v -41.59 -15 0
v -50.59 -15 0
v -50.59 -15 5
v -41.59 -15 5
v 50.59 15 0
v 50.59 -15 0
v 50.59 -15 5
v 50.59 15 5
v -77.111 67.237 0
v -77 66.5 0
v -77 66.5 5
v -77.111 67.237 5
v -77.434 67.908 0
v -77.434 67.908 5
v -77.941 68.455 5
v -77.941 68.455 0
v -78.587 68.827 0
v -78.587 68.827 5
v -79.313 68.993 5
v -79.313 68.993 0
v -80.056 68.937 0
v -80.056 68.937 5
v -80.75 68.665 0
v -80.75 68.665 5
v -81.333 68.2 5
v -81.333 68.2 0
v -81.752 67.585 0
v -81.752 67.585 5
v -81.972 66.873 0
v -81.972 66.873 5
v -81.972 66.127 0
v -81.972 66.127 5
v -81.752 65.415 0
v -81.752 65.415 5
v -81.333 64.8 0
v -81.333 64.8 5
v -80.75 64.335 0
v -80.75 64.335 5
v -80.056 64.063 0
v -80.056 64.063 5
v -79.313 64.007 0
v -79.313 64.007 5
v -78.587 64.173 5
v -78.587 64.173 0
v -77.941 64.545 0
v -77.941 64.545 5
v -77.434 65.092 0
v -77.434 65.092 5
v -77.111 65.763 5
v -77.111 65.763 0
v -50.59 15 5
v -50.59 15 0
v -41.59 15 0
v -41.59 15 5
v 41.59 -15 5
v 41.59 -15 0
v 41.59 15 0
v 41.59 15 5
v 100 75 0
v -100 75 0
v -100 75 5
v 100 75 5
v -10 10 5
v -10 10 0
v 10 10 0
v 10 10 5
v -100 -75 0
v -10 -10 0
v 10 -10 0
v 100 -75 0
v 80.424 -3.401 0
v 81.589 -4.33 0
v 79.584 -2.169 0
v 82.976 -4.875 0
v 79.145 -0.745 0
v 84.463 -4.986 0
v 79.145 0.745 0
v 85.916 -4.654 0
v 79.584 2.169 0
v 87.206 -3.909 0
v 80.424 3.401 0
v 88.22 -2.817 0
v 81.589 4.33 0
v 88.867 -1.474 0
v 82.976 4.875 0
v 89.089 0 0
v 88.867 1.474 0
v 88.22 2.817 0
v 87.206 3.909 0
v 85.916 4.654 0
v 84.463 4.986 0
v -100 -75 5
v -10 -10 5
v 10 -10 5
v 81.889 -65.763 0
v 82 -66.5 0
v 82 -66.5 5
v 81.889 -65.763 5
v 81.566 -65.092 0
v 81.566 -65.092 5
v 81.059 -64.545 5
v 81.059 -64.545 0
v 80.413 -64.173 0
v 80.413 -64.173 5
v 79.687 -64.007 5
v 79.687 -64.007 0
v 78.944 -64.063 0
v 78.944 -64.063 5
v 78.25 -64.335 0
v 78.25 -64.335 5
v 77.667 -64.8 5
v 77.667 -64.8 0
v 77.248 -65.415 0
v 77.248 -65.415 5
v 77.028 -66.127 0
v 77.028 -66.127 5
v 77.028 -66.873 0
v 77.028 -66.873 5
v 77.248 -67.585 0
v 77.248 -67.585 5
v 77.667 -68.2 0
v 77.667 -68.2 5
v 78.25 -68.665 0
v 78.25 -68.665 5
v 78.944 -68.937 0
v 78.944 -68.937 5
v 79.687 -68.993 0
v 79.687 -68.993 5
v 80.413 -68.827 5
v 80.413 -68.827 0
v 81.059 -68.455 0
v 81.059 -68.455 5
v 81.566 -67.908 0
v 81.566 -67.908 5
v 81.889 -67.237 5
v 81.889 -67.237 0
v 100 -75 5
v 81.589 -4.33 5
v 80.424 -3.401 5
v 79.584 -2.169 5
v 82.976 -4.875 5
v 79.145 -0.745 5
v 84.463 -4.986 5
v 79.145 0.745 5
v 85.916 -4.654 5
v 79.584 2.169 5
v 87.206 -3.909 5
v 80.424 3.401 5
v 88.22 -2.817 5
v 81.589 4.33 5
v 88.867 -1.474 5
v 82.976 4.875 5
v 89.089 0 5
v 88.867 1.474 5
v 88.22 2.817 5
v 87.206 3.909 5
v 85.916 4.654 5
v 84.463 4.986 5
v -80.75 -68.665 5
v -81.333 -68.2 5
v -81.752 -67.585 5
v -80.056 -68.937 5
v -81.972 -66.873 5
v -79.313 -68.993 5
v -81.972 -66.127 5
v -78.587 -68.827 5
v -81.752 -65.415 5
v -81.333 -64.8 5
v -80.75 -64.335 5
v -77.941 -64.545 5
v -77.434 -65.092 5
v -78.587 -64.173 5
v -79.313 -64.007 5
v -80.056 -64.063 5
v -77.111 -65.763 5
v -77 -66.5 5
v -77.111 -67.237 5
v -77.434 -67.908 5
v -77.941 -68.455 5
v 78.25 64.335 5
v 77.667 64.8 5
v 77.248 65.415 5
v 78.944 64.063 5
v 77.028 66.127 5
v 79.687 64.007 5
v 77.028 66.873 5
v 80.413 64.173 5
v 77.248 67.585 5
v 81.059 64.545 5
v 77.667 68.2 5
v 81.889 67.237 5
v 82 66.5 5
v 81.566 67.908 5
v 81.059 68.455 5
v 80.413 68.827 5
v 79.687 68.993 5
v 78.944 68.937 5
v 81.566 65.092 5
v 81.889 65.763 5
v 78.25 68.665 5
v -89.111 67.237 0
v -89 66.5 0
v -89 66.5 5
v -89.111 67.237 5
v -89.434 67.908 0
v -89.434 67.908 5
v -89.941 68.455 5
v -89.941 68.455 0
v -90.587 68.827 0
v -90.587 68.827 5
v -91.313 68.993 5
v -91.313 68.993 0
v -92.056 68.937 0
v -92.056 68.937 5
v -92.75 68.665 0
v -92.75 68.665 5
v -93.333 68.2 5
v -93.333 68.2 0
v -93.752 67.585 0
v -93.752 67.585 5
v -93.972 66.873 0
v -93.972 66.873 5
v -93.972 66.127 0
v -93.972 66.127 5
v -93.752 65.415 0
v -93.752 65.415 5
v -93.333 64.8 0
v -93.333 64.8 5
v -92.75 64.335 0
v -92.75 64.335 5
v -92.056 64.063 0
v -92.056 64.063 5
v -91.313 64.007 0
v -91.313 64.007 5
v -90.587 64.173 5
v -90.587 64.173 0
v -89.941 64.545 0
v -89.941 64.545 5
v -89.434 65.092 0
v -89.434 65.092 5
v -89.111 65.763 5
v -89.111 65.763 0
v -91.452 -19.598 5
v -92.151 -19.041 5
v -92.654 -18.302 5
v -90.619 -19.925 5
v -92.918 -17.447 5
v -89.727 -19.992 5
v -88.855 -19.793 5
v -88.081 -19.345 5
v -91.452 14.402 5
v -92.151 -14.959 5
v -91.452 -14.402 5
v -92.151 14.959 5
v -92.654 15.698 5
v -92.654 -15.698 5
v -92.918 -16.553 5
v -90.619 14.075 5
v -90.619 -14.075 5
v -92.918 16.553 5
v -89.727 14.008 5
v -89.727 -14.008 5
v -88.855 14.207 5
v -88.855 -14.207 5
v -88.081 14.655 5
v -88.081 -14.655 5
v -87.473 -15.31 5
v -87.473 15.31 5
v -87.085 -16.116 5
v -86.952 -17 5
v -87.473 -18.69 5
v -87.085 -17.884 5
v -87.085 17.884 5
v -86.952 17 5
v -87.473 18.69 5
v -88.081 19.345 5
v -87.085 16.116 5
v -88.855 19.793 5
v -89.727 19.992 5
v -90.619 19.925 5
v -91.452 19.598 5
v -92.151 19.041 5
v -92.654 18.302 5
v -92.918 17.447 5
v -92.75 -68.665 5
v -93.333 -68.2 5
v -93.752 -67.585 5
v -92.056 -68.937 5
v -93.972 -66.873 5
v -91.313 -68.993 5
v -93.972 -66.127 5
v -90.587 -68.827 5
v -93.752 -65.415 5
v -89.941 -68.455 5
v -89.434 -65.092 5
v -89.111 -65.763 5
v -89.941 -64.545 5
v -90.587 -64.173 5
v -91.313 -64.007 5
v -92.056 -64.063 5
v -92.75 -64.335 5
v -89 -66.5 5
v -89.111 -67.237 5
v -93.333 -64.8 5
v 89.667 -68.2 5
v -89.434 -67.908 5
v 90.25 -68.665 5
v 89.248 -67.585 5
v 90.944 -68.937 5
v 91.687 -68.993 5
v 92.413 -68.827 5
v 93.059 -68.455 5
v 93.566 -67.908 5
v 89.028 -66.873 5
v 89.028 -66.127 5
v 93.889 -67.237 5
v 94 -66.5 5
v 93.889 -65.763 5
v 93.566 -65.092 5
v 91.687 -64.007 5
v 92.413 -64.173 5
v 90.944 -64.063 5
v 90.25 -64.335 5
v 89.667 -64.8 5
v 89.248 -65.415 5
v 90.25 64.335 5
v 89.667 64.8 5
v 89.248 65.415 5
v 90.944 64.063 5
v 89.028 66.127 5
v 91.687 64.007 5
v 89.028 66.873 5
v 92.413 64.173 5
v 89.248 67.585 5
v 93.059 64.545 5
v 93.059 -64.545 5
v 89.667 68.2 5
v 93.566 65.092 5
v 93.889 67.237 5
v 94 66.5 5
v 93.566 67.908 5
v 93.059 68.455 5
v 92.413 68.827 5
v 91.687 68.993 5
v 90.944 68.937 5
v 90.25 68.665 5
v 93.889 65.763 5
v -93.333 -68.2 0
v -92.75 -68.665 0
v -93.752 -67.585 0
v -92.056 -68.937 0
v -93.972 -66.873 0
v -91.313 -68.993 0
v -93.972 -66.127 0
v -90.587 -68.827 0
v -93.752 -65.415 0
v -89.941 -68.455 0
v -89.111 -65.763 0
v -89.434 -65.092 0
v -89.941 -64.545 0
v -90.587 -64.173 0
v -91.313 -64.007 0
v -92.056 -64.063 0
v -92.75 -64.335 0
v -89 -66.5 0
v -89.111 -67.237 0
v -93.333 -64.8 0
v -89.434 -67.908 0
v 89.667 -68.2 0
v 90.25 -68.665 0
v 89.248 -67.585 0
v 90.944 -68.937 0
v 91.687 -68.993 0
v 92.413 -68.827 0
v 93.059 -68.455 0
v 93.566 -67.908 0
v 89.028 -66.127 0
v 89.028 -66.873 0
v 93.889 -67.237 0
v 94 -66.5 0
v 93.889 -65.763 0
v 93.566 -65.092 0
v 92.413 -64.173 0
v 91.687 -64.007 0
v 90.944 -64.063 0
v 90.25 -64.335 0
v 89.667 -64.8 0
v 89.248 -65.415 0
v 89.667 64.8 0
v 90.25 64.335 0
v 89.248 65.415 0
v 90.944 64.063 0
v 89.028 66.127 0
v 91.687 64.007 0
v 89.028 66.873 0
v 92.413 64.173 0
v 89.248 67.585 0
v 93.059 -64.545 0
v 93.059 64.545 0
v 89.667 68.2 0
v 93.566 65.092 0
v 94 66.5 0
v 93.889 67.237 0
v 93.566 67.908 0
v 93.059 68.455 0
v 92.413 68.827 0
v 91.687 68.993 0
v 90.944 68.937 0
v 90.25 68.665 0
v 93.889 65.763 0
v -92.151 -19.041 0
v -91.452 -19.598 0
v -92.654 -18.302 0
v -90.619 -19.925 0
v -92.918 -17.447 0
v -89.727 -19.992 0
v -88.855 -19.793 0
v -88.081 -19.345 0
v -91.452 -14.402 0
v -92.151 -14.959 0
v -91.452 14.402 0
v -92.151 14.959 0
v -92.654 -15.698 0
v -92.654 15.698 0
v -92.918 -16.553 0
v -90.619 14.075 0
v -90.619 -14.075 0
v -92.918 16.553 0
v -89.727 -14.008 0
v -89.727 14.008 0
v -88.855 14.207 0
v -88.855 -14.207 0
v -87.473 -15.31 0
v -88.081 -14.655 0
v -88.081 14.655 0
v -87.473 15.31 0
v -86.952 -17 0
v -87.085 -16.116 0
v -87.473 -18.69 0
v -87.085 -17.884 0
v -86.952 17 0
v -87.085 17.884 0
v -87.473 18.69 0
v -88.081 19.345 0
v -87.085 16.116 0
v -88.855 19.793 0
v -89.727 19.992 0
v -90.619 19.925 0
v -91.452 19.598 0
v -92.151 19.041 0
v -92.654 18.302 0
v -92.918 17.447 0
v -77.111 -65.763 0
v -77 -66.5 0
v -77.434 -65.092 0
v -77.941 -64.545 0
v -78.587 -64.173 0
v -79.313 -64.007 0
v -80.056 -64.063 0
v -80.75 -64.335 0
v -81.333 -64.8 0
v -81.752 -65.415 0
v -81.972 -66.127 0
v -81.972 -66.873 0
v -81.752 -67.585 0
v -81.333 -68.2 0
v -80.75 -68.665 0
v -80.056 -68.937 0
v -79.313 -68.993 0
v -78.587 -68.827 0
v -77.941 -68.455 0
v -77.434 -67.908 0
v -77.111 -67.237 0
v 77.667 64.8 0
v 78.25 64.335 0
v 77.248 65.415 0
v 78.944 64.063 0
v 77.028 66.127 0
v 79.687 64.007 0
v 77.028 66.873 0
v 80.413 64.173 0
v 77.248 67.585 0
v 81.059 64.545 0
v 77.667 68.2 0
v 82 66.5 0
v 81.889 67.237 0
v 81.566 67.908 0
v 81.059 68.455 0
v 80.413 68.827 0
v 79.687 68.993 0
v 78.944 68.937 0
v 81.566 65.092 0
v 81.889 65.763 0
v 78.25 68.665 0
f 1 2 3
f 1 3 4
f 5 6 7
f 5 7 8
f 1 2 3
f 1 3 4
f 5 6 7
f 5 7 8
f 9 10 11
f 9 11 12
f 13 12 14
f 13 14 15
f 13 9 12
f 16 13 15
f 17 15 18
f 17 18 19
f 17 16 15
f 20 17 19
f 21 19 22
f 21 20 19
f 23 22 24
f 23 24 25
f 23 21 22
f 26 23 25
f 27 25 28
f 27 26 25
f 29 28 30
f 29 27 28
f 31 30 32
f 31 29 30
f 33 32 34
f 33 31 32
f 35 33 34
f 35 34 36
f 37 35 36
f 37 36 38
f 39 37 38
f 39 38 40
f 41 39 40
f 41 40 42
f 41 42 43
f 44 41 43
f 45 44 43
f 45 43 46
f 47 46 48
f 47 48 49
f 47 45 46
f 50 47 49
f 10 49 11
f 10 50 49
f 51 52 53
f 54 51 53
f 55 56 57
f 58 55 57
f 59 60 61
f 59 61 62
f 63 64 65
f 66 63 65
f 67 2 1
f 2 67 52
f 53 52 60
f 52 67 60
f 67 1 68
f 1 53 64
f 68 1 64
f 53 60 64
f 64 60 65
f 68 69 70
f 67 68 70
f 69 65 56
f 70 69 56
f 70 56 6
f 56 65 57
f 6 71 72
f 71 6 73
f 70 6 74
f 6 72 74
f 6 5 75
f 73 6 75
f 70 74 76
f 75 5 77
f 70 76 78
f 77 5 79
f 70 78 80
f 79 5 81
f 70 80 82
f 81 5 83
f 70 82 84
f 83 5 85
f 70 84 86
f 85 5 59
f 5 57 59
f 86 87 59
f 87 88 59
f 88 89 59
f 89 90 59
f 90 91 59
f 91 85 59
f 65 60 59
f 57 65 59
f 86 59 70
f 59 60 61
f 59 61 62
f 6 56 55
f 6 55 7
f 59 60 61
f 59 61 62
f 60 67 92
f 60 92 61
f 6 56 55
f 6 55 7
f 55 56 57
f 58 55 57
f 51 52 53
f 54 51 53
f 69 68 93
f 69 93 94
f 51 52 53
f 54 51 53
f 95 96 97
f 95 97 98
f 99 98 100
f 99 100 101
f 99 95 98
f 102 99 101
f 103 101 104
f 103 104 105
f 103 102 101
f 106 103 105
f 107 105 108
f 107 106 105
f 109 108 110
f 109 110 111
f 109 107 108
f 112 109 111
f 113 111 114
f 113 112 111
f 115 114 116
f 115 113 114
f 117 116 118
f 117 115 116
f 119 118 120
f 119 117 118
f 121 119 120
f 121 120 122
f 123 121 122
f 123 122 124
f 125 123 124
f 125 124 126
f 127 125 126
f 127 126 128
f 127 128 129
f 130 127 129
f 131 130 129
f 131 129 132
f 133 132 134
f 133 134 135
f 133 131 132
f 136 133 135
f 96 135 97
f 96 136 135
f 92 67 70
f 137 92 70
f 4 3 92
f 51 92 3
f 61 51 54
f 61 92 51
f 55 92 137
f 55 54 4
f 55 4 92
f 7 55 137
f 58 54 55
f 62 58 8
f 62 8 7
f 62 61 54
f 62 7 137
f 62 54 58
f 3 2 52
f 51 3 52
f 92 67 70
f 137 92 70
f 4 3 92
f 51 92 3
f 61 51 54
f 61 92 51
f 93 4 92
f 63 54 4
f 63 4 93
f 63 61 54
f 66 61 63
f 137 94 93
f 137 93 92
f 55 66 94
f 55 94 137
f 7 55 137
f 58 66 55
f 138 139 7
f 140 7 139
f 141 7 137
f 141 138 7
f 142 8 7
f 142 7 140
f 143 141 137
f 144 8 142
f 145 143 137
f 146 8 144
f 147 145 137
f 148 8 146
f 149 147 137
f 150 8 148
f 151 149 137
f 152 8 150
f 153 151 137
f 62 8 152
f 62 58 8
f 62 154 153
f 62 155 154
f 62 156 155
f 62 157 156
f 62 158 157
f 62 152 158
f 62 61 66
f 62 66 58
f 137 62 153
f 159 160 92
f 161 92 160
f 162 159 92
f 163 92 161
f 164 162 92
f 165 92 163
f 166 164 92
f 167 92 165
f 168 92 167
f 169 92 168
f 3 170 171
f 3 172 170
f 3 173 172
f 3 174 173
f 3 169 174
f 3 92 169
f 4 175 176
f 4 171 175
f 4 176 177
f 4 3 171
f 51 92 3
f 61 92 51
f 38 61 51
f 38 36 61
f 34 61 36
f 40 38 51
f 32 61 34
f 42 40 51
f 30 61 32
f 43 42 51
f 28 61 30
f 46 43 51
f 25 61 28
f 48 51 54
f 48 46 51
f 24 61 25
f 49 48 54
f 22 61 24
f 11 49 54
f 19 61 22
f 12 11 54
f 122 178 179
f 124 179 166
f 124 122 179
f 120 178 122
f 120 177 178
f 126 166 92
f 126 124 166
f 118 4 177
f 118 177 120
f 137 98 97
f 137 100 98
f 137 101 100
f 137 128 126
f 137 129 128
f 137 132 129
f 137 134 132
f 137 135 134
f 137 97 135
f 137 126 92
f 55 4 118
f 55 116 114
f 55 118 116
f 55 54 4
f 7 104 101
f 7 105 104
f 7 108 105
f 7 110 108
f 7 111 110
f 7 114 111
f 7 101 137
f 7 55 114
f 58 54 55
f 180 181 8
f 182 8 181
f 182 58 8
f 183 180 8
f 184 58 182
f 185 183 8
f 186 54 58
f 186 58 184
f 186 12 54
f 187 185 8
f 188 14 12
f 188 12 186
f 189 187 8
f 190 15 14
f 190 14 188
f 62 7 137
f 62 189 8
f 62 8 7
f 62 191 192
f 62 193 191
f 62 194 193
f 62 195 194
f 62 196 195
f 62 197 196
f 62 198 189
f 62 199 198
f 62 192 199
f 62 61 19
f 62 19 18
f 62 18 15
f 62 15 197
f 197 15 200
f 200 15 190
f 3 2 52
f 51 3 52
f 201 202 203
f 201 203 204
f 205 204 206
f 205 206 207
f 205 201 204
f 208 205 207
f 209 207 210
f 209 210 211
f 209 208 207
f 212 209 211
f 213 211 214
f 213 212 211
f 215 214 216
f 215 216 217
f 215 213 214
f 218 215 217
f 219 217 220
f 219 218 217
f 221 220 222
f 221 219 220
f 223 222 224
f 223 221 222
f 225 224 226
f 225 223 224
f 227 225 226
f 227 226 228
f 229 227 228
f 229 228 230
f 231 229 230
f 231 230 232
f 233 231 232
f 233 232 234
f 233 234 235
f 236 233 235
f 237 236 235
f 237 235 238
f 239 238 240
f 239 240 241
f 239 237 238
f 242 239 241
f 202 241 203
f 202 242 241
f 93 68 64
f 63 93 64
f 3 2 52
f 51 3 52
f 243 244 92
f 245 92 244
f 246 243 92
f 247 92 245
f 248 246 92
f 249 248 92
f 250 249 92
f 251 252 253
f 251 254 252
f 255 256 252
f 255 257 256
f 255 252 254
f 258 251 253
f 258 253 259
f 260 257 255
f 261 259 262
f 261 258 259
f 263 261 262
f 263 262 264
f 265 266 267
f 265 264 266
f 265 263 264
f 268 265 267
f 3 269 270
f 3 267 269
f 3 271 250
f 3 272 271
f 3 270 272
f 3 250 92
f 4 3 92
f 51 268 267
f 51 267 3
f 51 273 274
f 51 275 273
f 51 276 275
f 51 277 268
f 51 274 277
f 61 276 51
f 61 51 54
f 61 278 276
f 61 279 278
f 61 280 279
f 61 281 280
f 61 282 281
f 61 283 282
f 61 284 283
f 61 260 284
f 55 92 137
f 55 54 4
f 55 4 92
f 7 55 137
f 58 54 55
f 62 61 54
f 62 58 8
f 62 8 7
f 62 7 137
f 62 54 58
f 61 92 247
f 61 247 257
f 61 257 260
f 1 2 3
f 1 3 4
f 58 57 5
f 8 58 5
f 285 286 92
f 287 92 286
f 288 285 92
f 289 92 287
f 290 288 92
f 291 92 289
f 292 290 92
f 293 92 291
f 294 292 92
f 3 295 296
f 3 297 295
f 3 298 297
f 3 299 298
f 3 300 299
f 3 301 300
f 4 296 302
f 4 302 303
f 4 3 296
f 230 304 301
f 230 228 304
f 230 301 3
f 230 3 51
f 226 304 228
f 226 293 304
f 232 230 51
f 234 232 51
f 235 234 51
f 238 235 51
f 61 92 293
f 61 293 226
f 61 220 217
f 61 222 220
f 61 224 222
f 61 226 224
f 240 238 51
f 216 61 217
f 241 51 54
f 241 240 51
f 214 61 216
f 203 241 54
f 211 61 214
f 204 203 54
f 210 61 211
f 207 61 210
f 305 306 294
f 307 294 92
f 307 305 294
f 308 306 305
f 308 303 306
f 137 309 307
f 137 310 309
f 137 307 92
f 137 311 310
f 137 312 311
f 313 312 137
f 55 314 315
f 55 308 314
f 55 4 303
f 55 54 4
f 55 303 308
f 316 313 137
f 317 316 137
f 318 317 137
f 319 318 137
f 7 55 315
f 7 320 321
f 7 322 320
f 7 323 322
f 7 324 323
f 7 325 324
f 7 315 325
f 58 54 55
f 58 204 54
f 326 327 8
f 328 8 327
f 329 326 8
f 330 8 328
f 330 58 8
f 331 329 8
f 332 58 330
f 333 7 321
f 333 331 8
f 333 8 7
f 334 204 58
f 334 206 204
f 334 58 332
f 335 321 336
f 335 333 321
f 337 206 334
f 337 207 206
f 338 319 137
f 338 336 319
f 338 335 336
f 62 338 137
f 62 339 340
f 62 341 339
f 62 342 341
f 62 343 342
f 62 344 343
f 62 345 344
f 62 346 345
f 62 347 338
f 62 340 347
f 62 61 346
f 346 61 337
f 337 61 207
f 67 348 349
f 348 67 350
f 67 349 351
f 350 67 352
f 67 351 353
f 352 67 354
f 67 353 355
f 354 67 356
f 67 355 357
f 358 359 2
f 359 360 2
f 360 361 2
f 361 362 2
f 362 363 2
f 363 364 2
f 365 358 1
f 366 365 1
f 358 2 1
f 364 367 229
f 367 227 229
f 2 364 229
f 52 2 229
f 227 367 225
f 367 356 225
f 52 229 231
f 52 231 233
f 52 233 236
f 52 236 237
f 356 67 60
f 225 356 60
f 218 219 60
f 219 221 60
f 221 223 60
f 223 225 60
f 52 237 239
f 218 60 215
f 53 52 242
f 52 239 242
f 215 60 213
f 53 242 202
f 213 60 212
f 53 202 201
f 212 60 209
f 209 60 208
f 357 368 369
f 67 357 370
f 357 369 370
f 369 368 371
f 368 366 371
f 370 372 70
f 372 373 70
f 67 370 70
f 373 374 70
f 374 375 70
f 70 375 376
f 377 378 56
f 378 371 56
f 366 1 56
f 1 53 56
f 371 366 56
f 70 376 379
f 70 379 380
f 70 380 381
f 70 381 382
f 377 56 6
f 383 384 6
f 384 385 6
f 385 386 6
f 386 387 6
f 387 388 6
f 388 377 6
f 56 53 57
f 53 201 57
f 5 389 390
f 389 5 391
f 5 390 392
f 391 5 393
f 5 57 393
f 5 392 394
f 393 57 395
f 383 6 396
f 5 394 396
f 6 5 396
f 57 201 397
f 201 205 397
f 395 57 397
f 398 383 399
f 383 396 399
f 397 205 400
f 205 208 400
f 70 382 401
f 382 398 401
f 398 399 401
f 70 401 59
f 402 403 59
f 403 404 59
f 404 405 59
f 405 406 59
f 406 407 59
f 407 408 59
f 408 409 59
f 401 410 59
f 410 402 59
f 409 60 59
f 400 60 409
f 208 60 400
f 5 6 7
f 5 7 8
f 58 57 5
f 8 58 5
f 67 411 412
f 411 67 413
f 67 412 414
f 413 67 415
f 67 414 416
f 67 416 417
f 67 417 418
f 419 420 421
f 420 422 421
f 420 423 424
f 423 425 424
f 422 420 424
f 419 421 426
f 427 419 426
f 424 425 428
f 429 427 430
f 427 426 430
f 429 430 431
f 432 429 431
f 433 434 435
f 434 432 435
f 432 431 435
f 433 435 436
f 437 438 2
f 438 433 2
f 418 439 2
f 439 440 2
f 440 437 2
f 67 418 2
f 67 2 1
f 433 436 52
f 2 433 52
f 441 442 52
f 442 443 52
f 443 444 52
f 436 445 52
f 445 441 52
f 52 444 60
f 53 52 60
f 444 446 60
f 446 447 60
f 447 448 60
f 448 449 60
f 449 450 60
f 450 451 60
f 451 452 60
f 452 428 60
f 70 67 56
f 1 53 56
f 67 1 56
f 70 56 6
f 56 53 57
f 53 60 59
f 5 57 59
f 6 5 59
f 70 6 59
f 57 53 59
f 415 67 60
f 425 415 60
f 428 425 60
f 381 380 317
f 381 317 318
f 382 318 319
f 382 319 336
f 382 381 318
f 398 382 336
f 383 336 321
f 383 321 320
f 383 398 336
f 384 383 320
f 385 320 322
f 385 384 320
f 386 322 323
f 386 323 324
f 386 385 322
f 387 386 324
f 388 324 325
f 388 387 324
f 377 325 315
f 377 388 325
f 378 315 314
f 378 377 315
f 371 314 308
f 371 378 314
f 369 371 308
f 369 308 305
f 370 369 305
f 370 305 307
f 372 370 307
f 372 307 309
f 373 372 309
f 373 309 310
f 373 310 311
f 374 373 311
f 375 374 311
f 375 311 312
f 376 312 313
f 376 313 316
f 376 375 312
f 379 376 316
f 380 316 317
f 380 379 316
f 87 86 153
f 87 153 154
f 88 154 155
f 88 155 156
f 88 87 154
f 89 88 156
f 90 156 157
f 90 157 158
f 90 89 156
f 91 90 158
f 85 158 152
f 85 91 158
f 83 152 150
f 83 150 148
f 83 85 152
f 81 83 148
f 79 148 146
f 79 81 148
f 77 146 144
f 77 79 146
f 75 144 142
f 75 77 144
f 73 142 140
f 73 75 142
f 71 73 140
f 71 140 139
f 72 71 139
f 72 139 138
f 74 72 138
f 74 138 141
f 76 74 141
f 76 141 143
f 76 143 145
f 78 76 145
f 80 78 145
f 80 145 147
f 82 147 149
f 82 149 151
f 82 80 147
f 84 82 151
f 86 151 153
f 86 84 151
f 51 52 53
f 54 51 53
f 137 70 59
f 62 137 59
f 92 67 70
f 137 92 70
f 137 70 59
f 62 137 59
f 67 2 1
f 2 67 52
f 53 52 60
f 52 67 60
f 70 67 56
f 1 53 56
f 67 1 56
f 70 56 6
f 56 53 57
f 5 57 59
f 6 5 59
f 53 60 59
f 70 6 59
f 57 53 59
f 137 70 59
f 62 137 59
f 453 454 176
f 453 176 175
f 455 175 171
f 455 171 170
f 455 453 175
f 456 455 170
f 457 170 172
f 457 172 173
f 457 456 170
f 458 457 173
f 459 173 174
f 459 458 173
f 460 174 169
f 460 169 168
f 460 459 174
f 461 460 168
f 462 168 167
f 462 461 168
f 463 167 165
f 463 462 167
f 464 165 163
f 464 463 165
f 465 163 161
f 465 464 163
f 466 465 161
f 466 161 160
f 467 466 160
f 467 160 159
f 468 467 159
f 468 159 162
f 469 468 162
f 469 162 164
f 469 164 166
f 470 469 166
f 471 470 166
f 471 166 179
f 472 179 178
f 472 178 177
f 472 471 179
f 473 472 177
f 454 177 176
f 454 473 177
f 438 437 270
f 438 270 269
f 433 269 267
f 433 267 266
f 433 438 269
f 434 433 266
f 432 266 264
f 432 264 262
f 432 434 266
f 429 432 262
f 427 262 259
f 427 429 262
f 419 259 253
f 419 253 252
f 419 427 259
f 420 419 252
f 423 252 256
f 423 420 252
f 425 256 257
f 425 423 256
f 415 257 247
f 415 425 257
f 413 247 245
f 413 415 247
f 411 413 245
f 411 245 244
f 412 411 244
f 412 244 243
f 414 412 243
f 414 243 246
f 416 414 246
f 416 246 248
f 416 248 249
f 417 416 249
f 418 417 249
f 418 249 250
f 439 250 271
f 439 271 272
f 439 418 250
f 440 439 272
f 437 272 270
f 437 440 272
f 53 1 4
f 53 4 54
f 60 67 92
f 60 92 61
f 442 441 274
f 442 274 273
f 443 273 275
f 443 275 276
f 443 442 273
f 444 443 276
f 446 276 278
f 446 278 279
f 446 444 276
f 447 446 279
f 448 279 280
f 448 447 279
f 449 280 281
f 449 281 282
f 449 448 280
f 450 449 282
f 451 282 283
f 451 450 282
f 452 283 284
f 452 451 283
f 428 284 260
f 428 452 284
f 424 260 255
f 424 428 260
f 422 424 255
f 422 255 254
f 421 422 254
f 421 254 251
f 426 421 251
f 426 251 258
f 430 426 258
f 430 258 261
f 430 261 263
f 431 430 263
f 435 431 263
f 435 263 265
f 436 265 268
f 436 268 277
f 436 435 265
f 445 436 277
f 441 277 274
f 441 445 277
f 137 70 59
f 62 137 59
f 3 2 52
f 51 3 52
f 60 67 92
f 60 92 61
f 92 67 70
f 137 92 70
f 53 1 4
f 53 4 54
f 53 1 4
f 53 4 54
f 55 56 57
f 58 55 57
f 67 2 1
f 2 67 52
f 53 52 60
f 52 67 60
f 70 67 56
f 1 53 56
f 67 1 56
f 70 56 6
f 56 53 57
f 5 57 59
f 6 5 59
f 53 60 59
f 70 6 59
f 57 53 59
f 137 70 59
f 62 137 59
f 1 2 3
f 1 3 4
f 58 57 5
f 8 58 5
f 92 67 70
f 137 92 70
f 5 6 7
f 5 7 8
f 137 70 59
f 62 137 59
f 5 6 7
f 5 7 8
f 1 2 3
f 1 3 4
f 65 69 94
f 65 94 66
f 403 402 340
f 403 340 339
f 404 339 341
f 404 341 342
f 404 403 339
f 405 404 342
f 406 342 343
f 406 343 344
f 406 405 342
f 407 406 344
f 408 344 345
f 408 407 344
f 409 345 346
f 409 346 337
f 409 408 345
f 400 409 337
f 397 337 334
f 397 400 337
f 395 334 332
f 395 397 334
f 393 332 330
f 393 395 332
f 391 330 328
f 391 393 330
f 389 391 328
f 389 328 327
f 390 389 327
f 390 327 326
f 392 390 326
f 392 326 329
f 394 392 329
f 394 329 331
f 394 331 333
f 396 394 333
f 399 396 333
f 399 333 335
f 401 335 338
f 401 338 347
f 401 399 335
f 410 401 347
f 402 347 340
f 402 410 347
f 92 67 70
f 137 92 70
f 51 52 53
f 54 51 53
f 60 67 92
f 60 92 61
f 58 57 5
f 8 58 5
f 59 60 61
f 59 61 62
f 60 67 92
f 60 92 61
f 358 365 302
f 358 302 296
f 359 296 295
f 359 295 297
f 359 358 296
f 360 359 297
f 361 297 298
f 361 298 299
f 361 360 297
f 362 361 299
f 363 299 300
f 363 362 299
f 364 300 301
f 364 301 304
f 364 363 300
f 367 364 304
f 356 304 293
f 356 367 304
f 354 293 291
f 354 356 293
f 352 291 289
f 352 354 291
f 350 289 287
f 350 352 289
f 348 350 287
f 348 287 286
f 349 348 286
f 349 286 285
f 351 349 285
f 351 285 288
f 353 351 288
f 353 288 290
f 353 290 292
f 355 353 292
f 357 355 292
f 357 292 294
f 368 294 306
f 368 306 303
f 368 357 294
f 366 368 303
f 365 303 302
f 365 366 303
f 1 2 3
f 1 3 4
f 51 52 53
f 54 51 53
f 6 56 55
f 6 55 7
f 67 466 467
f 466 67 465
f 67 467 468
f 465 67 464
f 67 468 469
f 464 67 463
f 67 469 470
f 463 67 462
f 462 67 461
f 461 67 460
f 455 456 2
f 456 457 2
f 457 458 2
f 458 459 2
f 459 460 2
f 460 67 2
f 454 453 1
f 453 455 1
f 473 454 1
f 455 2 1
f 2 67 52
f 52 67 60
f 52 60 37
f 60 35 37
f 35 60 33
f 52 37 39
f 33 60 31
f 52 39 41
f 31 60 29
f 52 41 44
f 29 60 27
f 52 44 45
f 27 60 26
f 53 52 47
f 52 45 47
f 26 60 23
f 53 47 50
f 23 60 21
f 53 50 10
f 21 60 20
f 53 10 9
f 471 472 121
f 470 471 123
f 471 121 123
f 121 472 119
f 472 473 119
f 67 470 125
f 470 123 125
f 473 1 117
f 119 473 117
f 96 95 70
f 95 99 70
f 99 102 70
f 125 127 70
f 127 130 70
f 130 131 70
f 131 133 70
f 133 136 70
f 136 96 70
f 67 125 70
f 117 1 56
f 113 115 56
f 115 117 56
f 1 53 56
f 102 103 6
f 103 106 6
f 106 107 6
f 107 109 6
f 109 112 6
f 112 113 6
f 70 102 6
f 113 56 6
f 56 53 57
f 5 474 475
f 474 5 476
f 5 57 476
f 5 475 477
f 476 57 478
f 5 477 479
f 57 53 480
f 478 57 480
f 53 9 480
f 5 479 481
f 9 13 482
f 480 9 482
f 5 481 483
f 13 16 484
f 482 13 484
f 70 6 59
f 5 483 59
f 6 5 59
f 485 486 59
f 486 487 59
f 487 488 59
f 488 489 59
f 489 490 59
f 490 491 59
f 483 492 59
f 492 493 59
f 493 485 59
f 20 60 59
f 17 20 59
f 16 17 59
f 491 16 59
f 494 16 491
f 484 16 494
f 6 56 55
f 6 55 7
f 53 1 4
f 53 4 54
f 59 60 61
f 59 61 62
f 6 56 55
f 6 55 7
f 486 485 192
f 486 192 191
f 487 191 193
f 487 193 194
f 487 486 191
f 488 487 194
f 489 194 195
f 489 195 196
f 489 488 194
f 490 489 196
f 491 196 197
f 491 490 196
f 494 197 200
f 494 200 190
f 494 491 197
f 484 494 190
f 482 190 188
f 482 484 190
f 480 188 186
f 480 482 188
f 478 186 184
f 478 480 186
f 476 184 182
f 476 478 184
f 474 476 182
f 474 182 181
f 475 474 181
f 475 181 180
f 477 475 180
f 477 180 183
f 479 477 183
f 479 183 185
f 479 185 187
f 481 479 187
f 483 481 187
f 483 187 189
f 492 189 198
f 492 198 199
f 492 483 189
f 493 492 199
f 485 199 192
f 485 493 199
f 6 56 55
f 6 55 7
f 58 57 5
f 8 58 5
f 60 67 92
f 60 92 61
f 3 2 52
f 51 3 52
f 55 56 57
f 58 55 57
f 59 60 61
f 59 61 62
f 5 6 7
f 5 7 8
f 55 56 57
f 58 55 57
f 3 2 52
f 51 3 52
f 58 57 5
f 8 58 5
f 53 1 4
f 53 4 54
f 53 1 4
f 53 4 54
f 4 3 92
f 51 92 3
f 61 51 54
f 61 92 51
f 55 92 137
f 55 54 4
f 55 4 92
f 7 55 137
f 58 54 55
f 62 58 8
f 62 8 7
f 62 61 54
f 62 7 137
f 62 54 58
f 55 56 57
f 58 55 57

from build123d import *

# Parameters (mm, degrees)
F0_W     = 200
F0_H     = 150
F0_W_2   = 9
F0_H_2   = 30
F6_DEPTH = 5
F1_W     = 200
F1_H     = 150
F1_R     = 2.5
F1_W_2   = 9
F1_H_2   = 30
F2_W     = 200
F2_H     = 150
F2_R     = 2.5
F2_W_2   = 9
F2_H_2   = 30
F5_W     = 200
F5_H     = 150
F5_W_2   = 9
F5_H_2   = 30
F4_W     = 200
F4_H     = 150
F4_W_2   = 9
F4_H_2   = 30
F4_W_3   = 20
F4_H_3   = 20
F4_R     = 5
F3_W     = 200
F3_H     = 150
F3_R     = 3
F3_W_2   = 9
F3_H_2   = 30


with BuildPart() as f6:
    # F0 (on Top) → F6 (new body)
    with BuildSketch(Plane.XY):
        Rectangle(F0_W, F0_H)
        with Locations((-46.0899434984, 0)):
            Rectangle(F0_W_2, F0_H_2, mode=Mode.SUBTRACT)
        with Locations((46.0899434984, 0)):
            Rectangle(F0_W_2, F0_H_2, mode=Mode.SUBTRACT)
    extrude(amount=F6_DEPTH)


with BuildPart() as f6b:
    # F1 (on face) → F6, piece 2 (new body)
    with BuildSketch(Plane.XY):
        Rectangle(F1_W, F1_H)
        with Locations((-91.5, -66.5)):
            Circle(F1_R, mode=Mode.SUBTRACT)
        with Locations((91.5, -66.5)):
            Circle(F1_R, mode=Mode.SUBTRACT)
        with Locations((-46.0899434984, 0)):
            Rectangle(F1_W_2, F1_H_2, mode=Mode.SUBTRACT)
        with Locations((-91.5, 66.5)):
            Circle(F1_R, mode=Mode.SUBTRACT)
        with Locations((46.0899434984, 0)):
            Rectangle(F1_W_2, F1_H_2, mode=Mode.SUBTRACT)
        with Locations((91.5, 66.5)):
            Circle(F1_R, mode=Mode.SUBTRACT)
    extrude(amount=F6_DEPTH)


with BuildPart() as f6c:
    # F2 (on face) → F6, piece 3 (new body)
    with BuildSketch(Plane.XY):
        Rectangle(F2_W, F2_H)
        with Locations((-79.5, -66.5)):
            Circle(F2_R, mode=Mode.SUBTRACT)
        with Locations((79.5, -66.5)):
            Circle(F2_R, mode=Mode.SUBTRACT)
        with Locations((-46.0899434984, 0)):
            Rectangle(F2_W_2, F2_H_2, mode=Mode.SUBTRACT)
        with Locations((-79.5, 66.5)):
            Circle(F2_R, mode=Mode.SUBTRACT)
        with Locations((46.0899434984, 0)):
            Rectangle(F2_W_2, F2_H_2, mode=Mode.SUBTRACT)
        with Locations((79.5, 66.5)):
            Circle(F2_R, mode=Mode.SUBTRACT)
    extrude(amount=F6_DEPTH)


with BuildPart() as f6d:
    # F5 (on face) → F6, piece 4 (new body)
    with BuildSketch(Plane.XY):
        Rectangle(F5_W, F5_H)
        with Locations((-46.0899434984, 0)):
            Rectangle(F5_W_2, F5_H_2, mode=Mode.SUBTRACT)
        with Locations((46.0899434984, 0)):
            Rectangle(F5_W_2, F5_H_2, mode=Mode.SUBTRACT)
    extrude(amount=F6_DEPTH)


with BuildPart() as f6e:
    # F4 (on face) → F6, piece 5 (new body)
    with BuildSketch(Plane.XY):
        Rectangle(F4_W, F4_H)
        with Locations((-46.0899434984, 0)):
            Rectangle(F4_W_2, F4_H_2, mode=Mode.SUBTRACT)
        Rectangle(F4_W_3, F4_H_3, mode=Mode.SUBTRACT)
        with Locations((46.0899434984, 0)):
            Rectangle(F4_W_2, F4_H_2, mode=Mode.SUBTRACT)
        with Locations((84.0889811516, 0)):
            Circle(F4_R, mode=Mode.SUBTRACT)
    extrude(amount=F6_DEPTH)


with BuildPart() as f6f:
    # F3 (on face) → F6, piece 6 (new body)
    with BuildSketch(Plane.XY):
        Rectangle(F3_W, F3_H)
        with Locations((-89.9515226483, -17)):
            Circle(F3_R, mode=Mode.SUBTRACT)
        with Locations((-89.9515226483, 17)):
            Circle(F3_R, mode=Mode.SUBTRACT)
        with Locations((-46.0899434984, 0)):
            Rectangle(F3_W_2, F3_H_2, mode=Mode.SUBTRACT)
        with Locations((46.0899434984, 0)):
            Rectangle(F3_W_2, F3_H_2, mode=Mode.SUBTRACT)
    extrude(amount=F6_DEPTH)


solid = Compound([f6.part, f6b.part, f6c.part, f6d.part, f6e.part, f6f.part])
